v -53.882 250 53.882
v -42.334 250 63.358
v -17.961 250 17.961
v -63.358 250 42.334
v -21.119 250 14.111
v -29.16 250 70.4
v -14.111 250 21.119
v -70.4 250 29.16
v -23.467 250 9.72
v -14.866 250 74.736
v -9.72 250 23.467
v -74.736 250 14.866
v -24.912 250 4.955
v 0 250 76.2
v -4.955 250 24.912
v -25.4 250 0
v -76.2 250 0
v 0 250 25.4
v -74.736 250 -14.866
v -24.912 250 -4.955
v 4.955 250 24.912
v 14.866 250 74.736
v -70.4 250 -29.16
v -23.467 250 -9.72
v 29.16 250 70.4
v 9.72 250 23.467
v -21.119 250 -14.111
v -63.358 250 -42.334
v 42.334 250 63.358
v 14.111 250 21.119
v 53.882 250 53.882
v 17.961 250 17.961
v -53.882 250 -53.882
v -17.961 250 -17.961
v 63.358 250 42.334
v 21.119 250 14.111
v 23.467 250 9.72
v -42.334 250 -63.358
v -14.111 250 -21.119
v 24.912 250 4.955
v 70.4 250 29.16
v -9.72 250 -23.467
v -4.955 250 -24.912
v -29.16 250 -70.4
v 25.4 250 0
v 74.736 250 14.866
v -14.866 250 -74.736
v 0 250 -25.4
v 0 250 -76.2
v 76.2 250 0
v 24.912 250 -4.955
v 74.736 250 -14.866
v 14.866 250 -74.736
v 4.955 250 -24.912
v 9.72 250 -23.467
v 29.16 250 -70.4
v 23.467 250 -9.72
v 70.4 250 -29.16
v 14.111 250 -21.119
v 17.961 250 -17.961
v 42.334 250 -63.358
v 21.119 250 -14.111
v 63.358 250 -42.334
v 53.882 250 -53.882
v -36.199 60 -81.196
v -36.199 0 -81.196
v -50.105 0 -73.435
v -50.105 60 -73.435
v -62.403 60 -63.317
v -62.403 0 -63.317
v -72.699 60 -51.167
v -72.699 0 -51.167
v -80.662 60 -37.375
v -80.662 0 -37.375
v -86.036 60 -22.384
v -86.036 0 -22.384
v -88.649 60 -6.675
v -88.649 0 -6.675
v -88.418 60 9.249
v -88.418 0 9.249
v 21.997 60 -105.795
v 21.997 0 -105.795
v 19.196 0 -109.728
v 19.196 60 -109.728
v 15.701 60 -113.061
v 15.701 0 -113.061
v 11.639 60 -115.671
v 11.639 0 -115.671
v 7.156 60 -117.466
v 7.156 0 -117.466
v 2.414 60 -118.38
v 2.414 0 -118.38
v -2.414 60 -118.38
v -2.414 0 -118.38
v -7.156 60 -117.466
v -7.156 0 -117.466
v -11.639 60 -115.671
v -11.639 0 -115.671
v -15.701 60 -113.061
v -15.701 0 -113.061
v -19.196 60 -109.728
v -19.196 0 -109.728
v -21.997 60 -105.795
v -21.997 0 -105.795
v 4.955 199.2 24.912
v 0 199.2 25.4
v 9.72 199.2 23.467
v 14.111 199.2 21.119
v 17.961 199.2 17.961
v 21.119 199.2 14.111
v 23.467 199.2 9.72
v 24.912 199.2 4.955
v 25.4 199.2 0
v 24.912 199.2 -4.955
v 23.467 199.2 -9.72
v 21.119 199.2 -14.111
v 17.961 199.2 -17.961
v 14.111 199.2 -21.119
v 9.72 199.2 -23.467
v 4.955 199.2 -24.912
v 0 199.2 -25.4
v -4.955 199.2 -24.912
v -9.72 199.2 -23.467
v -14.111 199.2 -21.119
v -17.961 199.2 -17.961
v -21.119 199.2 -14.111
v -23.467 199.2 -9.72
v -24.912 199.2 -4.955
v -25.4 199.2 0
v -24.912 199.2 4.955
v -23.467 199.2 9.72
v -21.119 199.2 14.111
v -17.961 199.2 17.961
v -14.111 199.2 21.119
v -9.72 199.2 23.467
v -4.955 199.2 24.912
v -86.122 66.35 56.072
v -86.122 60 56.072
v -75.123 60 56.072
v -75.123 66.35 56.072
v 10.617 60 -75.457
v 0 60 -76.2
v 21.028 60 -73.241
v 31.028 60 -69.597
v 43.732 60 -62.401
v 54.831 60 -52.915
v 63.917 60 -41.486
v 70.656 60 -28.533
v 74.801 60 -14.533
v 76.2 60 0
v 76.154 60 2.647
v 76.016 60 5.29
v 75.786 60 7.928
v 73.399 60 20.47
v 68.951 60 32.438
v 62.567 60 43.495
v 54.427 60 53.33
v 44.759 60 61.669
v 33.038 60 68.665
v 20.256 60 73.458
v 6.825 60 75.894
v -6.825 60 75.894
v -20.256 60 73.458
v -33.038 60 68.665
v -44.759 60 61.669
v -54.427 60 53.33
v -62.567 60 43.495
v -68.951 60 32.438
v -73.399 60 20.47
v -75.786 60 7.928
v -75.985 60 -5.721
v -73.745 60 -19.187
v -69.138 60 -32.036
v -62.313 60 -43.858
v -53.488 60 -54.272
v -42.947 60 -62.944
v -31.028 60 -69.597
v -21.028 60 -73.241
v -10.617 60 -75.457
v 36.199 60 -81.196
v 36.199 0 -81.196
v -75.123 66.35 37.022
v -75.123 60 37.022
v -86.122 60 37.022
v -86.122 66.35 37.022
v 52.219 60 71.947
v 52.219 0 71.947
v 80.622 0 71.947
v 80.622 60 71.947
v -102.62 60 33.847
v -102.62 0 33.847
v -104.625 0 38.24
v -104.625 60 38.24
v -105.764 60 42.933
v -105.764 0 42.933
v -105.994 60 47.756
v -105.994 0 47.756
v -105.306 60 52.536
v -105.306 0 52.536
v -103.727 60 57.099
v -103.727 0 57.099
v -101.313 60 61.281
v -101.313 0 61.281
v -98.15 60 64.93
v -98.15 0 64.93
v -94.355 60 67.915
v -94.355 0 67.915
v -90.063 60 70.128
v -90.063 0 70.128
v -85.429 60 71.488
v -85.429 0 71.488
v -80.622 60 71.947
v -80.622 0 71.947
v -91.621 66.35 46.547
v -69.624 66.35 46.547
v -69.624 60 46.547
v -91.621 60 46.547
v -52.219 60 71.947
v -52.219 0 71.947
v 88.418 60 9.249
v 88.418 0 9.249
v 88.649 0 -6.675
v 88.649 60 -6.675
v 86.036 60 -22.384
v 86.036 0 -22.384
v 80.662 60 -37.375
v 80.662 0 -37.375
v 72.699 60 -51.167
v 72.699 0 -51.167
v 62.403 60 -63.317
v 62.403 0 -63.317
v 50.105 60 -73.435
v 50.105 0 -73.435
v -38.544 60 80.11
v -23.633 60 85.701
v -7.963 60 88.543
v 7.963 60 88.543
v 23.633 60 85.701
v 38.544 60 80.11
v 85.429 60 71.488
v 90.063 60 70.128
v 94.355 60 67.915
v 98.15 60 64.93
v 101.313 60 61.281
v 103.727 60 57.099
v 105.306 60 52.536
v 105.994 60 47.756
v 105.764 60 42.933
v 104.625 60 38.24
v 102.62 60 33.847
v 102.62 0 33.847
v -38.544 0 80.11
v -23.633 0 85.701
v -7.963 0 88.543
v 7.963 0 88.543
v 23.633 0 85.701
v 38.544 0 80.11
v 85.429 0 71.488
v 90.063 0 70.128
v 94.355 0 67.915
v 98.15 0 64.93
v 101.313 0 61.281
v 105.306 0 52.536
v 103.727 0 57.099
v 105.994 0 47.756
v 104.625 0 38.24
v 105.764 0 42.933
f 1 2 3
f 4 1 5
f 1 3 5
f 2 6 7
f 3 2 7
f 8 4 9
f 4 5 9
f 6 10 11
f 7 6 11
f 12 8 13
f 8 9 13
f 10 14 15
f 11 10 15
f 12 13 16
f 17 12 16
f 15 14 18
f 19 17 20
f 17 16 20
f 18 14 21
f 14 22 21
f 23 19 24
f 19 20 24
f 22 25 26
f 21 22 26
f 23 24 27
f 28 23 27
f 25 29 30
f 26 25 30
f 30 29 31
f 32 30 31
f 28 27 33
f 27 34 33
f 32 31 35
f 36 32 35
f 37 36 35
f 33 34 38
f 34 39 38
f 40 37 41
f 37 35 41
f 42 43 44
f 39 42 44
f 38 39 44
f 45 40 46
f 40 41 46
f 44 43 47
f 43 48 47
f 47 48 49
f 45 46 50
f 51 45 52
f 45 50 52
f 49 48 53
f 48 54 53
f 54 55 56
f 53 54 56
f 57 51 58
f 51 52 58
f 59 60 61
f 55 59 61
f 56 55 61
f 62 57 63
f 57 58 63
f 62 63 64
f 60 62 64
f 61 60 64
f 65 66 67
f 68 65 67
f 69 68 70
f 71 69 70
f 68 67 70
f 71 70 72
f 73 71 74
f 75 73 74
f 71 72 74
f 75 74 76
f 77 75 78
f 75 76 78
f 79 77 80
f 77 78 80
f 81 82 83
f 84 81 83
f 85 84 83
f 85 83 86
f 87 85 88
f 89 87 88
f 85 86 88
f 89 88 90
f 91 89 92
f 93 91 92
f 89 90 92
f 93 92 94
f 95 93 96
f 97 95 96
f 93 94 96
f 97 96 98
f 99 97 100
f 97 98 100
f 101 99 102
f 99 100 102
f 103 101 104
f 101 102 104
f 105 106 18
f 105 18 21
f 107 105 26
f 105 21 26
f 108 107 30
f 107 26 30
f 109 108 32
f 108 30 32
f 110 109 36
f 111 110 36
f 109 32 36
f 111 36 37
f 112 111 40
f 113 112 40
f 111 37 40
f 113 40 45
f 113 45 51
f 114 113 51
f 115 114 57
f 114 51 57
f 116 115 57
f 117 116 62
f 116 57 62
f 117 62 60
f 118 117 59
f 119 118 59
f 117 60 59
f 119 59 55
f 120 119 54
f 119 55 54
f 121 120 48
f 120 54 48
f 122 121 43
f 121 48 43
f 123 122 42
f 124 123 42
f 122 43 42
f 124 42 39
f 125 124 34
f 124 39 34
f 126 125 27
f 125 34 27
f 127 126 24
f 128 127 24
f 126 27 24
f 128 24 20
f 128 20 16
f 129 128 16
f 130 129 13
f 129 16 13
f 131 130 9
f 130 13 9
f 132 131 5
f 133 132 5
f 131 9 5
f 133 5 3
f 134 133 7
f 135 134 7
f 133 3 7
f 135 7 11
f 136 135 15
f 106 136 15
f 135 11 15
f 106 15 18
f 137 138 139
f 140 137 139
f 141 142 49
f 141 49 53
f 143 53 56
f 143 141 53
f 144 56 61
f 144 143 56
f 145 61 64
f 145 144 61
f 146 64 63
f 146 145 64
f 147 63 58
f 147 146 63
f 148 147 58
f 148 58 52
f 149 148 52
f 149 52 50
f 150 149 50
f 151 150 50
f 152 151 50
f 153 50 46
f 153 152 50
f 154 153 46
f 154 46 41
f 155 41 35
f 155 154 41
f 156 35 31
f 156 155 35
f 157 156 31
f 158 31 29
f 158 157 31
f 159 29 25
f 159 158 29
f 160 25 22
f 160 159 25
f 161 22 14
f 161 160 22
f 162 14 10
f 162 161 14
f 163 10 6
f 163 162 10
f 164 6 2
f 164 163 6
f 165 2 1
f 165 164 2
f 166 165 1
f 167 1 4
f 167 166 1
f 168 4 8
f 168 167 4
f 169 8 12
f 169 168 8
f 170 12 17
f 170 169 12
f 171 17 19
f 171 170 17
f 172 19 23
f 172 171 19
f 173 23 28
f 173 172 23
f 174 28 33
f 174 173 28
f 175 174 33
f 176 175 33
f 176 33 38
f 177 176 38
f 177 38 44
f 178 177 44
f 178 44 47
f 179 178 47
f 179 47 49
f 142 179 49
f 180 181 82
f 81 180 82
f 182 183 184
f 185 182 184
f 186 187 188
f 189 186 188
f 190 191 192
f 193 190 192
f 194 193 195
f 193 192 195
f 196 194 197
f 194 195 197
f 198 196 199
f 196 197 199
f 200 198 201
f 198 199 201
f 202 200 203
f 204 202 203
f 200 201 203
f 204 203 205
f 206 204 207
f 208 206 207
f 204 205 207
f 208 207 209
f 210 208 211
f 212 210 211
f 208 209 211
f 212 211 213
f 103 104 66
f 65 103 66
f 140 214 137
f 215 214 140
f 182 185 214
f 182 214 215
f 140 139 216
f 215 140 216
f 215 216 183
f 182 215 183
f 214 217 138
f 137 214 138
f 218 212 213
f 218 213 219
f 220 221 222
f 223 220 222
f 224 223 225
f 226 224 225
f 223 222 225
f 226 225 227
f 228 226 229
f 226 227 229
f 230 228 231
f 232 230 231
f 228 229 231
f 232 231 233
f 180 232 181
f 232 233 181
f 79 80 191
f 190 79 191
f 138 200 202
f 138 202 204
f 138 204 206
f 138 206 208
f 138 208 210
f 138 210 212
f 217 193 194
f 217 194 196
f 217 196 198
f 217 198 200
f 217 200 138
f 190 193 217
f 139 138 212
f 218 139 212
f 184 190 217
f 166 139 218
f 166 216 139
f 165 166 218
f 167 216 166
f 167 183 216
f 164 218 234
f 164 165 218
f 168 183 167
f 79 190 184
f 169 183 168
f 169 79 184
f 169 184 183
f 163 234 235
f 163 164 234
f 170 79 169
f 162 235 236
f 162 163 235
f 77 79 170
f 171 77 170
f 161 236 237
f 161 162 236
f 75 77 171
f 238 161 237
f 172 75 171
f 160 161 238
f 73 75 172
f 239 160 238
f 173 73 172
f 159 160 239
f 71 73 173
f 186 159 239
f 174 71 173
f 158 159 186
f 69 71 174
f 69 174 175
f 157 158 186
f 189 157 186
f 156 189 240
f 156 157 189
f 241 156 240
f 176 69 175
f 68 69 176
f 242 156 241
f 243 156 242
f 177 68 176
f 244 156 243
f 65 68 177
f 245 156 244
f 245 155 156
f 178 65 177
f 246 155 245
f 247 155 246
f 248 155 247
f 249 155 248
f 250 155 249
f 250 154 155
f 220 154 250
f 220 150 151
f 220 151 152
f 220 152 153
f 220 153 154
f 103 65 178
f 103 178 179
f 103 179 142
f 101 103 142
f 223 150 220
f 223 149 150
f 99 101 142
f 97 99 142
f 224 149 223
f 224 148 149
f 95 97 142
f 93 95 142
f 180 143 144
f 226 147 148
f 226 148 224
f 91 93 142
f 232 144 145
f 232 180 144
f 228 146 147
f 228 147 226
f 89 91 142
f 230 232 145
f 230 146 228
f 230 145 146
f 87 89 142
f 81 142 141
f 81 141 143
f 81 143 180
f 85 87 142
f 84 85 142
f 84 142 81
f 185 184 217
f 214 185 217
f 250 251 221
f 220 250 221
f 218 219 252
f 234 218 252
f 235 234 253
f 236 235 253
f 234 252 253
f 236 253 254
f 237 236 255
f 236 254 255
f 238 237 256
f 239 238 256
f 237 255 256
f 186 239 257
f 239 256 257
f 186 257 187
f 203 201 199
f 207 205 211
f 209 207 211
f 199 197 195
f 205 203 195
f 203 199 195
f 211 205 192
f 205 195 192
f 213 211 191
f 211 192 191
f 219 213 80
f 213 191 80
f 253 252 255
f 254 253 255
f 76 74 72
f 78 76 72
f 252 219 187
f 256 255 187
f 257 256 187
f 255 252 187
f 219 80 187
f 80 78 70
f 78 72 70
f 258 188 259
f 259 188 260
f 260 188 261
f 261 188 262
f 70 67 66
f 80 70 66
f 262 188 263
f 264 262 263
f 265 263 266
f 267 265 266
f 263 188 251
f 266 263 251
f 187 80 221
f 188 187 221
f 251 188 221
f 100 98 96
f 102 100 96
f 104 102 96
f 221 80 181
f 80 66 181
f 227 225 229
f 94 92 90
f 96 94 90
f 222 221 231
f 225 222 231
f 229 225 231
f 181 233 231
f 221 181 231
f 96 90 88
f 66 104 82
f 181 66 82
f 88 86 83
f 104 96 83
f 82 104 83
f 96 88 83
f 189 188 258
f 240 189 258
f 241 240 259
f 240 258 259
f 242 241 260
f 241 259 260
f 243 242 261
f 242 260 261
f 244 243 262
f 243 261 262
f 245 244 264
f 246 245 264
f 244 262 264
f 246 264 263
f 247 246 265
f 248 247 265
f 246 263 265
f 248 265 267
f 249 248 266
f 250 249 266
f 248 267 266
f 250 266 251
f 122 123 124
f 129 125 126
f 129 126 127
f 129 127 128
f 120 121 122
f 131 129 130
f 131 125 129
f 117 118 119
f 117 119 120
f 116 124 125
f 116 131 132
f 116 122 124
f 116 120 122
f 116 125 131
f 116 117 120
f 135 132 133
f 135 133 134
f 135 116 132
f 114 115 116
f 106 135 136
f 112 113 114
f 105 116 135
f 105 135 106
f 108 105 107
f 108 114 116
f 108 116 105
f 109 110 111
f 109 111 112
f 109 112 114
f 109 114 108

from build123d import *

# Parameters (mm, degrees)
BOSS_EXTRUDE1_DEPTH = 60
BOSS_EXTRUDE2_DEPTH = 6.35
SKETCH3_R           = 76.2
BOSS_EXTRUDE3_DEPTH = 250
SKETCH4_R           = 25.4
CUT_EXTRUDE1_DEPTH  = 50.8


with BuildPart() as part:
    # Sketch1 → Boss-Extrude1 (new body)
    with BuildSketch(Plane(origin=(0, 0, 0), x_dir=(1, 0, 0), z_dir=(0, 1, 0))):
        with BuildLine():
            ThreePointArc((-36.198972693, 81.196332281), (-76.989658396, 44.45), (-88.417572796, -9.248936198))
            Line((-88.417572796, -9.248936198), (-102.619500233, -33.847396084))
            ThreePointArc((-102.619500233, -33.847396084), (-102.619500233, -59.247396084), (-80.622454977, -71.947396084))
            Line((-80.622454977, -71.947396084), (-52.218600103, -71.947396084))
            ThreePointArc((-52.218600103, -71.947396084), (0, -88.9), (52.218600103, -71.947396084))
            Line((52.218600103, -71.947396084), (80.622454977, -71.947396084))
            ThreePointArc((80.622454977, -71.947396084), (102.619500233, -59.247396084), (102.619500233, -33.847396084))
            Line((102.619500233, -33.847396084), (88.417572796, -9.248936198))
            ThreePointArc((88.417572796, -9.248936198), (76.989658396, 44.45), (36.198972693, 81.196332281))
            Line((36.198972693, 81.196332281), (21.997045256, 105.794792168))
            ThreePointArc((21.997045256, 105.794792168), (0, 118.494792168), (-21.997045256, 105.794792168))
            Line((-21.997045256, 105.794792168), (-36.198972693, 81.196332281))
        make_face()
        with BuildLine():
            ThreePointArc((-75.786490968, -7.927659598), (-65.991135768, 38.1), (-31.02769088, 69.596856241))
            ThreePointArc((-31.02769088, 69.596856241), (0, 76.2), (31.02769088, 69.596856241))
            ThreePointArc((31.02769088, 69.596856241), (63.916938463, 41.485720163), (76.2, 0))
            ThreePointArc((76.2, 0), (76.096552523, -3.969218324), (75.786490968, -7.927659598))
            ThreePointArc((75.786490968, -7.927659598), (65.991135768, -38.1), (44.758800089, -61.669196643))
            ThreePointArc((44.758800089, -61.669196643), (0, -76.2), (-44.758800089, -61.669196643))
            ThreePointArc((-44.758800089, -61.669196643), (-65.991135768, -38.1), (-75.786490968, -7.927659598))
        make_face(mode=Mode.SUBTRACT)
    extrude(amount=BOSS_EXTRUDE1_DEPTH)

    # Sketch2 → Boss-Extrude2 (add)
    with BuildSketch(Plane(origin=(0, 60, 0), x_dir=(1, 0, 0), z_dir=(0, 1, 0))):
        Polygon((-69.623932349, -46.547396084), (-75.123193663, -37.022396084), (-86.121716291, -37.022396084), (-91.620977605, -46.547396084), (-86.121716291, -56.072396084), (-75.123193663, -56.072396084), align=None)
    extrude(amount=BOSS_EXTRUDE2_DEPTH)

    # Sketch3 → Boss-Extrude3 (add)
    with BuildSketch(Plane.XZ):
        with Locations(Location((0, 0, 0), (0, 0, 270))):
            Circle(SKETCH3_R)
    extrude(amount=-BOSS_EXTRUDE3_DEPTH)

    # Sketch4 → Cut-Extrude1 (cut)
    with BuildSketch(Plane(origin=(0, 250, 0), x_dir=(1, 0, 0), z_dir=(0, 1, 0))):
        with Locations(Location((0, 0, 0), (0, 0, 270))):
            Circle(SKETCH4_R)
    extrude(amount=-CUT_EXTRUDE1_DEPTH, mode=Mode.SUBTRACT)


solid = part.part
